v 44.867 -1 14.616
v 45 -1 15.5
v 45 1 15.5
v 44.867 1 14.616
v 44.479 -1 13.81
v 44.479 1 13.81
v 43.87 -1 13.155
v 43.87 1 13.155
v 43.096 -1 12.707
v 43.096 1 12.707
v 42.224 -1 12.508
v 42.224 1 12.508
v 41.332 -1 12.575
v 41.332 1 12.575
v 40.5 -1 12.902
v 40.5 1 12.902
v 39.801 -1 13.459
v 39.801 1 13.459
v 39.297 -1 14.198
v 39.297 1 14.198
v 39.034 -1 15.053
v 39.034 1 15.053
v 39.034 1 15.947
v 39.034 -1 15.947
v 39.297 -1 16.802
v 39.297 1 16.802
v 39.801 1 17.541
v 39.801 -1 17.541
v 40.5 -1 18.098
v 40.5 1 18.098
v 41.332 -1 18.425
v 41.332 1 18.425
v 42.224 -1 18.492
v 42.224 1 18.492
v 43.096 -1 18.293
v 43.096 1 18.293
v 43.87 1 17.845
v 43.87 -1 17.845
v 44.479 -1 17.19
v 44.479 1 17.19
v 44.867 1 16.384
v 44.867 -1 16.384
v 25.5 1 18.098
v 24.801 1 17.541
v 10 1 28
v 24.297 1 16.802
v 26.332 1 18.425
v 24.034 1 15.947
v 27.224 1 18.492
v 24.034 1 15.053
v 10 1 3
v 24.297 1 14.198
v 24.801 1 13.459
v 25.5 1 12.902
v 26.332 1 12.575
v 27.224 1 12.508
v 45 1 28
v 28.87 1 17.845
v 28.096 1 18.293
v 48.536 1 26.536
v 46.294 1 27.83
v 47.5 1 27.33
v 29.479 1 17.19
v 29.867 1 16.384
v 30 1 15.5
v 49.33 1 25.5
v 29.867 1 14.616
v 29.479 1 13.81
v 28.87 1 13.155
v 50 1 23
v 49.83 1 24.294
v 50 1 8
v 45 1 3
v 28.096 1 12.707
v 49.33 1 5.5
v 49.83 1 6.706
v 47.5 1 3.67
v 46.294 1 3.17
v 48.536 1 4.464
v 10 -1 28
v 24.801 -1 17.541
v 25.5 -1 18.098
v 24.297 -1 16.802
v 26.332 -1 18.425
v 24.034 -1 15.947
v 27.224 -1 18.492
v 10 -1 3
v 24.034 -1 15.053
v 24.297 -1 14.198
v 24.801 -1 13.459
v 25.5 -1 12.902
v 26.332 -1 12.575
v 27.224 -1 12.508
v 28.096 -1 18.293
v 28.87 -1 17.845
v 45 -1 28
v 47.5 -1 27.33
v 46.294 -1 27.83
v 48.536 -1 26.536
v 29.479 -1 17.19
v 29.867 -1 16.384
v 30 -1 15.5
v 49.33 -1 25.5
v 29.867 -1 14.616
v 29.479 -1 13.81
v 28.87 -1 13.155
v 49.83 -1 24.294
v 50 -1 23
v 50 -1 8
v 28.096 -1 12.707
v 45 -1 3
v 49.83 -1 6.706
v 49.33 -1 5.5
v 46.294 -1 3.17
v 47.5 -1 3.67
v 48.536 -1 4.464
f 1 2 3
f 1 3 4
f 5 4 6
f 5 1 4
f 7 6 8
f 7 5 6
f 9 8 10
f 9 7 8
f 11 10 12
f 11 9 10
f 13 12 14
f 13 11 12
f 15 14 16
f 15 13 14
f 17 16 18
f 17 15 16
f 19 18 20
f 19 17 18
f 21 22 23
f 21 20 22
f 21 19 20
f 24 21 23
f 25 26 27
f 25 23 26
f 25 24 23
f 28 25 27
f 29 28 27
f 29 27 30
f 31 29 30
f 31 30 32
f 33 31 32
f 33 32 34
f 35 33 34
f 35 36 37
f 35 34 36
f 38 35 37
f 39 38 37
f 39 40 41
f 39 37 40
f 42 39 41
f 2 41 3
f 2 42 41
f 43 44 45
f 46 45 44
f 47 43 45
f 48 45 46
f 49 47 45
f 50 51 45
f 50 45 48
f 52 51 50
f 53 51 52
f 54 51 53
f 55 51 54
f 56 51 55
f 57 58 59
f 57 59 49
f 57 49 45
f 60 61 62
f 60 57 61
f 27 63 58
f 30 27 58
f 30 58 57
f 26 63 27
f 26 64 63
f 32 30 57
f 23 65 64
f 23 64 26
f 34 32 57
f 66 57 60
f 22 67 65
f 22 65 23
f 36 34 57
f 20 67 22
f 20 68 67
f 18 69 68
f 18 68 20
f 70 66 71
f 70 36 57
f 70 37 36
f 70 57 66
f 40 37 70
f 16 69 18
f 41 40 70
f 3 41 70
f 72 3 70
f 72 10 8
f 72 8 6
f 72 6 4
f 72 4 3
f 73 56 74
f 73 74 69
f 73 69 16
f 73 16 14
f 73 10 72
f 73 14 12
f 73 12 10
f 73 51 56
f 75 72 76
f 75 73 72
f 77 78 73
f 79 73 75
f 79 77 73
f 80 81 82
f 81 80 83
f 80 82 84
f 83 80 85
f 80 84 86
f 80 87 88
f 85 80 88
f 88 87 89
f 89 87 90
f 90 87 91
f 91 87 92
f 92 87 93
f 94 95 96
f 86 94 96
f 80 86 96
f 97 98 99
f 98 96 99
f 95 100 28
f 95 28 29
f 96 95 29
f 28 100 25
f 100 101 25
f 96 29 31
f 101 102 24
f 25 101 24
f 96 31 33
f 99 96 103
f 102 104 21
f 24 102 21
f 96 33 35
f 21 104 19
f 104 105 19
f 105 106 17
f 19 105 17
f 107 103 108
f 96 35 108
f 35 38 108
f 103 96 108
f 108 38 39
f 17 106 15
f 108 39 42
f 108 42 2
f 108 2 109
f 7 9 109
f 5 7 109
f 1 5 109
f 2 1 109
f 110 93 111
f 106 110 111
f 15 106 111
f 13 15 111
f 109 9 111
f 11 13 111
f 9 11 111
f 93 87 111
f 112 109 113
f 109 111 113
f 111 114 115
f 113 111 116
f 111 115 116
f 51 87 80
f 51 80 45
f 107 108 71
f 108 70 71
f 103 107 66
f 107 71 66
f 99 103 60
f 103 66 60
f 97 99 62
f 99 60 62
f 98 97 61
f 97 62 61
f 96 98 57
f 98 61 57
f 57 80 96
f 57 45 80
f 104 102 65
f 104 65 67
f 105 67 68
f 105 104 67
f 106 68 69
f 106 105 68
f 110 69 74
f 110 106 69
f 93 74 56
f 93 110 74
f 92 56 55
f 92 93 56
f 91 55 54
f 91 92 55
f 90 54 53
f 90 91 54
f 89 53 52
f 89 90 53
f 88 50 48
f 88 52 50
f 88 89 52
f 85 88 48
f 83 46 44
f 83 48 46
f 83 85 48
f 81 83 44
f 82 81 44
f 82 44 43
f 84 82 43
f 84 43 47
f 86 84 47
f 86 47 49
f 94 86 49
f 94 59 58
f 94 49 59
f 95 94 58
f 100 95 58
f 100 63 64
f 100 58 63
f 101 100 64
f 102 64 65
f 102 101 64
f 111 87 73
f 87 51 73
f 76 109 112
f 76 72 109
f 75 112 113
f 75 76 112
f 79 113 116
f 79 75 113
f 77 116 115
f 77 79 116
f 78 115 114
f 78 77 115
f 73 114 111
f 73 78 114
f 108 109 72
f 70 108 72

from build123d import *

# Parameters (mm, degrees)
CYLINDER001_R     = 3
CYLINDER001_DEPTH = 10
CYLINDER002_R     = 3
CYLINDER002_DEPTH = 10
BOX_W             = 40
BOX_H             = 2
BOX_DEPTH         = 25
FILLET_R          = 5


with BuildPart() as cylinder001:
    # Cylinder001 → Cylinder001 (new body)
    with BuildSketch(Plane(origin=(32, -5, 12.5), x_dir=(1, 0, 0), z_dir=(0, 1, 0))):
        Circle(CYLINDER001_R)
    extrude(amount=CYLINDER001_DEPTH)


with BuildPart() as compound:
    # Cylinder002 → Cylinder002 (new body)
    with BuildSketch(Plane(origin=(17, -5, 12.5), x_dir=(1, 0, 0), z_dir=(0, 1, 0))):
        Circle(CYLINDER002_R)
    extrude(amount=CYLINDER002_DEPTH)

    # Compound: union Cylinder001
    add(cylinder001.part)


with BuildPart() as cut:
    # Box → Box (new body)
    with BuildSketch(Plane(origin=(0, -1, 0), x_dir=(1, 0, 0), z_dir=(0, 0, 1))):
        with Locations((20, 1)):
            Rectangle(BOX_W, BOX_H)
    extrude(amount=BOX_DEPTH)

    # Fillet
    fillet_edges = [cut.edges().sort_by_distance(p)[0] for p in [
        (40, 0, 25),
        (40, 0, 0),
    ]]
    fillet(fillet_edges, radius=FILLET_R)

    # Cut: cut Compound
    add(compound.part, mode=Mode.SUBTRACT)


with BuildPart() as cut_1:
    # Cut placement: moved
    add(cut.part.moved(Location((10, 0, 3))))


solid = cut_1.part
